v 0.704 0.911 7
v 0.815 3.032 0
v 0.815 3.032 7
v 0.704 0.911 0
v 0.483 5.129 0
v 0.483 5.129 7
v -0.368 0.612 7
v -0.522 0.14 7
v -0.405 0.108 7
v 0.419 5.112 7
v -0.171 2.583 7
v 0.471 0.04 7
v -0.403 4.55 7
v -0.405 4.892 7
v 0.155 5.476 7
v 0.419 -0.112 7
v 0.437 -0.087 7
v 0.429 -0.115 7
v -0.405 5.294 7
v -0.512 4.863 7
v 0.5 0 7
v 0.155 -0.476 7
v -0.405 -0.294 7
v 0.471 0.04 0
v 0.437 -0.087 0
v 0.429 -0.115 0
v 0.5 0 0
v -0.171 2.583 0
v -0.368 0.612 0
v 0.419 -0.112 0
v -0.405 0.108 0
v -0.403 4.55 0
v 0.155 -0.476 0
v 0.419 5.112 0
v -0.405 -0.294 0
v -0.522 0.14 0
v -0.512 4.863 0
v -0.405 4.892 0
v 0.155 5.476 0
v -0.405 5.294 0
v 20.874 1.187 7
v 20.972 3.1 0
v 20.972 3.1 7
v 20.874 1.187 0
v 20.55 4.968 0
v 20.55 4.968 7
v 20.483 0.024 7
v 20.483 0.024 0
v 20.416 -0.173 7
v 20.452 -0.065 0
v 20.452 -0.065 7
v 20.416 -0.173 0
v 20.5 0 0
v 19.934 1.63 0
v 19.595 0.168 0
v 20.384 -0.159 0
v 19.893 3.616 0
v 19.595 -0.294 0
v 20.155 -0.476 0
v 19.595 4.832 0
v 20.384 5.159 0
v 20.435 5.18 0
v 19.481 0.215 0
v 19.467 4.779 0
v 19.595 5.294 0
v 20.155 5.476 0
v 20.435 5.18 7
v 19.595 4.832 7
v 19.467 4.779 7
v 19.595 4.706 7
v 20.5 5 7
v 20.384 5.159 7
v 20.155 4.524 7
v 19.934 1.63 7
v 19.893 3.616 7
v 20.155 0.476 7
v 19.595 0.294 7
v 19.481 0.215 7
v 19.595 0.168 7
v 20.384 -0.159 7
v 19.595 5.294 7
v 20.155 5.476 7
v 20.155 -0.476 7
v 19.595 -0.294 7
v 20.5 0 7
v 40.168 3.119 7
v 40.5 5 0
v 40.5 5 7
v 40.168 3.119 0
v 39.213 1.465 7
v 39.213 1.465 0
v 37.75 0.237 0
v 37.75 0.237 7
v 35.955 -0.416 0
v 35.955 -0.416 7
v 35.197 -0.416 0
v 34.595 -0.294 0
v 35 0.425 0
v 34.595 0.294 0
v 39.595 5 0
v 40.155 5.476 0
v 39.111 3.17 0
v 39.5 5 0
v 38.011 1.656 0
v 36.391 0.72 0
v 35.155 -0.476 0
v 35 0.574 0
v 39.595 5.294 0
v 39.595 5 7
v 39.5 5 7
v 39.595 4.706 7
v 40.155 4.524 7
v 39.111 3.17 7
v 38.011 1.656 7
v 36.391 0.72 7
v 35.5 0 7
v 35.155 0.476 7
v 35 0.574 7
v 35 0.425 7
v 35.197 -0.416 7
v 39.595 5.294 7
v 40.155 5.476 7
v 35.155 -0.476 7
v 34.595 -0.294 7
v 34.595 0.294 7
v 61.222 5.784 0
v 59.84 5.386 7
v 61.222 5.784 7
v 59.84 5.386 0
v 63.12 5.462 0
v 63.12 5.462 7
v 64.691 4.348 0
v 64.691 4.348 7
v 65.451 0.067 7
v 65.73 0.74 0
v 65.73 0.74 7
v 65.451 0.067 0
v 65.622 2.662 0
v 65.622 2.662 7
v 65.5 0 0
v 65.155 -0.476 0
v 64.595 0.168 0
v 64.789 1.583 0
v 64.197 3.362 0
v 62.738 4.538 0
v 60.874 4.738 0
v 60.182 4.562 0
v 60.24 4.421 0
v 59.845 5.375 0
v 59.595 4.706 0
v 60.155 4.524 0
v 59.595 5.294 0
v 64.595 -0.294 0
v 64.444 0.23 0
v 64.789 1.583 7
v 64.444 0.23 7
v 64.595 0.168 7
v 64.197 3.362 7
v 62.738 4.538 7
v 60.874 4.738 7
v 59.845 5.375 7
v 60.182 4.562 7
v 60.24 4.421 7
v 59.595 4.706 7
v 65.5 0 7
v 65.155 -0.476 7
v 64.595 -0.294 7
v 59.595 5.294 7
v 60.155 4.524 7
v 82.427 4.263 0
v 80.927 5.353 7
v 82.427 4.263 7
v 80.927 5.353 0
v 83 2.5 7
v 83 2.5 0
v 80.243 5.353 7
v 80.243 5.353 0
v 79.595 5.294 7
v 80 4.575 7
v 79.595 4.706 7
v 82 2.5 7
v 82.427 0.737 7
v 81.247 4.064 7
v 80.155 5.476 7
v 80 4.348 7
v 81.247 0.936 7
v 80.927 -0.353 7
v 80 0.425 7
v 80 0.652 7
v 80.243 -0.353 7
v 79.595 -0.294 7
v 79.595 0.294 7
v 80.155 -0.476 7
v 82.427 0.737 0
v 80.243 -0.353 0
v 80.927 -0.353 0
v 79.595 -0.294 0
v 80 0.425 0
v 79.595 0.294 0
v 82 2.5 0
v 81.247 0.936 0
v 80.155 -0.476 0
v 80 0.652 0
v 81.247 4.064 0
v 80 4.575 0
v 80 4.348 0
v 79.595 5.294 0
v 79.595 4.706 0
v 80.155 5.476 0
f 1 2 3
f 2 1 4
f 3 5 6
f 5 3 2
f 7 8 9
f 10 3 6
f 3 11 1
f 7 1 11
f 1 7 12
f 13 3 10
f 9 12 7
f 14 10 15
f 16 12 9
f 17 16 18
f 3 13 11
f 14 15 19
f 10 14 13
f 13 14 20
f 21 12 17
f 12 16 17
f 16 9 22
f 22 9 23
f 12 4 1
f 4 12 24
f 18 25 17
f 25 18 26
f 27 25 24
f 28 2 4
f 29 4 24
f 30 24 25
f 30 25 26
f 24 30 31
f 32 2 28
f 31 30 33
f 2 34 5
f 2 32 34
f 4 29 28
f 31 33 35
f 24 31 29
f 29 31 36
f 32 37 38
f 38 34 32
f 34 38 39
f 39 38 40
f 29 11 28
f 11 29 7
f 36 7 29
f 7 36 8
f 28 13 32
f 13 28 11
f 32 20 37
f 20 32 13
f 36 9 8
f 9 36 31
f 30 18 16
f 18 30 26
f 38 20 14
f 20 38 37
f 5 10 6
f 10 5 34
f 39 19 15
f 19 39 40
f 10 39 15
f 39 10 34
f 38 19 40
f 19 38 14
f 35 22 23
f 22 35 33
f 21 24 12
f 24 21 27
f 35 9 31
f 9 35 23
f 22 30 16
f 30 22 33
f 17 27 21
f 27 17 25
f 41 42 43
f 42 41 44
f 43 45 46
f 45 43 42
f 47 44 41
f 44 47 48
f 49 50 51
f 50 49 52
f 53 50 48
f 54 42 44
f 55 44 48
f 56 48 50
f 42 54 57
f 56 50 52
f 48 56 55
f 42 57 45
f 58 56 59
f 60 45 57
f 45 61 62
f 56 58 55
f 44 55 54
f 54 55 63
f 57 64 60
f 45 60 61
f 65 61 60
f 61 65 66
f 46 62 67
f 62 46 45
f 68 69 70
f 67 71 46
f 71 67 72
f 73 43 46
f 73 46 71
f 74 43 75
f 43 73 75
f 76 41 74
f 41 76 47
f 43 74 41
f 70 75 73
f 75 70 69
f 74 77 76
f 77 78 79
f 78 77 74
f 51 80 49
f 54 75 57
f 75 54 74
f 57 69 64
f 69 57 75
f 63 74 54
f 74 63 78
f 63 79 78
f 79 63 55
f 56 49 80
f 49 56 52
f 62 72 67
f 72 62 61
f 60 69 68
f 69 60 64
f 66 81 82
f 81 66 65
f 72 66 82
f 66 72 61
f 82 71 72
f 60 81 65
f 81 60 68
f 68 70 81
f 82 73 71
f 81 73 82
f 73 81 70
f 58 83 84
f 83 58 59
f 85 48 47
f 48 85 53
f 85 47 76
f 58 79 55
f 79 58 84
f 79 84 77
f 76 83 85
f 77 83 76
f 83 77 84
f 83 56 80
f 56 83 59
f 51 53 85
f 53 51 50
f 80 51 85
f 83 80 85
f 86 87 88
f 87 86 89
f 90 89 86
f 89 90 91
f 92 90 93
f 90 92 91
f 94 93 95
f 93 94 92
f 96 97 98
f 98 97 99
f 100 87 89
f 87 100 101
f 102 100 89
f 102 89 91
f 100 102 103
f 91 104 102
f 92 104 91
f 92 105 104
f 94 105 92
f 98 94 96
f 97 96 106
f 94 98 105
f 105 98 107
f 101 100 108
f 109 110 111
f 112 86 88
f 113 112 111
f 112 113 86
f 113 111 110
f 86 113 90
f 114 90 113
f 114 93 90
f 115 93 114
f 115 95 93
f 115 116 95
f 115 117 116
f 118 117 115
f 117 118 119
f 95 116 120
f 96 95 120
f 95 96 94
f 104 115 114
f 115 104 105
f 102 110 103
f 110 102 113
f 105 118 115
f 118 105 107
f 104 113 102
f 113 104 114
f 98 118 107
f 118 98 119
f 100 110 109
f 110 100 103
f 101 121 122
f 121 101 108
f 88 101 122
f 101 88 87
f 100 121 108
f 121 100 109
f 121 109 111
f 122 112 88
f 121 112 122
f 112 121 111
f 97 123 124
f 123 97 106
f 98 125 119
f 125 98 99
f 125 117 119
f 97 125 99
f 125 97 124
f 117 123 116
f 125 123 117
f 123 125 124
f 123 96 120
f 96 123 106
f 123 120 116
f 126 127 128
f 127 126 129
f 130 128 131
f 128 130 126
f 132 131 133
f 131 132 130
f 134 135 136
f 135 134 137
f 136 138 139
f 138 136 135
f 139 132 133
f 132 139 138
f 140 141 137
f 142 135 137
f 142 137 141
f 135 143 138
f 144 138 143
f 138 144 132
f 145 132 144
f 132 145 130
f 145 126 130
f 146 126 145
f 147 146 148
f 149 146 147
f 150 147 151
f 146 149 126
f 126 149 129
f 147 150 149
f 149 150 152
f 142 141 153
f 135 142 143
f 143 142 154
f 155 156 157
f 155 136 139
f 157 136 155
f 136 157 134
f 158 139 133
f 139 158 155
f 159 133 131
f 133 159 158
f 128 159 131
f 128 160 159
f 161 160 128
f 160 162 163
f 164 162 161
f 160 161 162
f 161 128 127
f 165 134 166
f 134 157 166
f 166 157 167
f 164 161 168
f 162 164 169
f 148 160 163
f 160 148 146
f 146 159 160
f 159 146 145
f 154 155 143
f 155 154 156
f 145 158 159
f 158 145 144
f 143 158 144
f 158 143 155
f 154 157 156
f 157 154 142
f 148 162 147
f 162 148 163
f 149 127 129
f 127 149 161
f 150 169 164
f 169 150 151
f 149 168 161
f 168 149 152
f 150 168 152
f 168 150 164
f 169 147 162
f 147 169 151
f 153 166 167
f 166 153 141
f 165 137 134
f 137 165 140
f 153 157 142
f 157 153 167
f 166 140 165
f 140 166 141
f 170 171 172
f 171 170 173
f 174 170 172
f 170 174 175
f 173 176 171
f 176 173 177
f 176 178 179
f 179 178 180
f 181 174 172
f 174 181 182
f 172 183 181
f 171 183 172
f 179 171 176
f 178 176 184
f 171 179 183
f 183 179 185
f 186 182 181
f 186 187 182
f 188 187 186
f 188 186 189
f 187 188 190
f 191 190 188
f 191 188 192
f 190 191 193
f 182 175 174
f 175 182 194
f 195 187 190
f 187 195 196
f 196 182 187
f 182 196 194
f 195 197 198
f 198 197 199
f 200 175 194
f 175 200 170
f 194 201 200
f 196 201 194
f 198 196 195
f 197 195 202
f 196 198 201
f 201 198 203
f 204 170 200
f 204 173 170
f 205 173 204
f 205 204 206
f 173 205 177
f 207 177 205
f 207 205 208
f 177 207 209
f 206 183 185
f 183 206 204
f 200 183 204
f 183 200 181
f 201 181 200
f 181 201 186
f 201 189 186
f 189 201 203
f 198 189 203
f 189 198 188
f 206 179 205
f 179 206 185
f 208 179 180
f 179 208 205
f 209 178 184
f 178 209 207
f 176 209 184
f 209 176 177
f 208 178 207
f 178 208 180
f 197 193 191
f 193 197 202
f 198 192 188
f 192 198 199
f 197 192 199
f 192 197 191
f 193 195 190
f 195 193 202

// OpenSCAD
/* Yet Another Arc Library
 * Calculates an arc by cutting apart cylinders. Only good in the z plane.
 * What's kind of nice is that you can jsut specify what the coordinates of
 * your arc should start and end at.
 * Only good up to 180 degrees.
 */

function scalar(vec) = sqrt(pow(vec.x, 2) + pow(vec.y, 2) + pow(vec.z, 2));

module arc(startCoordinates, endCoordinates, degrees, height, width) {
	deltaCoordinates = endCoordinates - startCoordinates;
	currArcLength = scalar(deltaCoordinates);
	radius = currArcLength / (2 * sin(degrees/2));
	
	render() {
		translate(endCoordinates)
			rotate(atan2(-deltaCoordinates.y, -deltaCoordinates.x))
				lineUpArc(currArcLength, degrees, radius, height, width);
		translate(endCoordinates)
			cylinder(h = height, d = width);
		translate(startCoordinates)
			cylinder(h = height, d = width);
	}
}

module lineUpArc(currArcLength, degrees, radius, height, width) {
	outerArcDiameter = radius * 2 + width;
	innerArcDiameter = radius * 2 - width;
	translate([currArcLength/2,-cos(degrees / 2)*radius,0])
		rotate(degrees / 2)
			roughArc(outerArcDiameter, innerArcDiameter, degrees, height);
}

module roughArc(outerArcDiameter, innerArcDiameter, degrees, height) {
	difference() {
		rotate(180 - degrees) difference() {
			hollowCylinder(outerArcDiameter, innerArcDiameter, height);
			translate([-outerArcDiameter / 2, -outerArcDiameter / 2, 0])
			cube([outerArcDiameter / 2, outerArcDiameter, height]);
		}
		translate([-outerArcDiameter / 2, -outerArcDiameter / 2, 0])
			cube([outerArcDiameter / 2, outerArcDiameter, height]);
	}
}

module hollowCylinder(outerArcDiameter, innerArcDiameter, height) {
	difference() {
		cylinder(h = height, d = outerArcDiameter);
		cylinder(h = height, d = innerArcDiameter);
	}
}


// BEGIN TESTS
// Several Different Arcs

translate([0, 0, 0])
	arc([0,0,0], [0,5,0], 30, 7, 1);

translate([20, 0, 0])
	arc([0,0,0],  [0,5,0], 45, 7, 1);

translate([40, 0, 0])
	arc([-5,0,0],  [0,5,0], 90, 7, 1);

translate([60, 0, 0])
	arc([5,0,0],  [0,5,0], 135, 7, 1);

translate([80, 0, 0])
	arc([0,0,0],  [0,5,0], 180, 7, 1);
